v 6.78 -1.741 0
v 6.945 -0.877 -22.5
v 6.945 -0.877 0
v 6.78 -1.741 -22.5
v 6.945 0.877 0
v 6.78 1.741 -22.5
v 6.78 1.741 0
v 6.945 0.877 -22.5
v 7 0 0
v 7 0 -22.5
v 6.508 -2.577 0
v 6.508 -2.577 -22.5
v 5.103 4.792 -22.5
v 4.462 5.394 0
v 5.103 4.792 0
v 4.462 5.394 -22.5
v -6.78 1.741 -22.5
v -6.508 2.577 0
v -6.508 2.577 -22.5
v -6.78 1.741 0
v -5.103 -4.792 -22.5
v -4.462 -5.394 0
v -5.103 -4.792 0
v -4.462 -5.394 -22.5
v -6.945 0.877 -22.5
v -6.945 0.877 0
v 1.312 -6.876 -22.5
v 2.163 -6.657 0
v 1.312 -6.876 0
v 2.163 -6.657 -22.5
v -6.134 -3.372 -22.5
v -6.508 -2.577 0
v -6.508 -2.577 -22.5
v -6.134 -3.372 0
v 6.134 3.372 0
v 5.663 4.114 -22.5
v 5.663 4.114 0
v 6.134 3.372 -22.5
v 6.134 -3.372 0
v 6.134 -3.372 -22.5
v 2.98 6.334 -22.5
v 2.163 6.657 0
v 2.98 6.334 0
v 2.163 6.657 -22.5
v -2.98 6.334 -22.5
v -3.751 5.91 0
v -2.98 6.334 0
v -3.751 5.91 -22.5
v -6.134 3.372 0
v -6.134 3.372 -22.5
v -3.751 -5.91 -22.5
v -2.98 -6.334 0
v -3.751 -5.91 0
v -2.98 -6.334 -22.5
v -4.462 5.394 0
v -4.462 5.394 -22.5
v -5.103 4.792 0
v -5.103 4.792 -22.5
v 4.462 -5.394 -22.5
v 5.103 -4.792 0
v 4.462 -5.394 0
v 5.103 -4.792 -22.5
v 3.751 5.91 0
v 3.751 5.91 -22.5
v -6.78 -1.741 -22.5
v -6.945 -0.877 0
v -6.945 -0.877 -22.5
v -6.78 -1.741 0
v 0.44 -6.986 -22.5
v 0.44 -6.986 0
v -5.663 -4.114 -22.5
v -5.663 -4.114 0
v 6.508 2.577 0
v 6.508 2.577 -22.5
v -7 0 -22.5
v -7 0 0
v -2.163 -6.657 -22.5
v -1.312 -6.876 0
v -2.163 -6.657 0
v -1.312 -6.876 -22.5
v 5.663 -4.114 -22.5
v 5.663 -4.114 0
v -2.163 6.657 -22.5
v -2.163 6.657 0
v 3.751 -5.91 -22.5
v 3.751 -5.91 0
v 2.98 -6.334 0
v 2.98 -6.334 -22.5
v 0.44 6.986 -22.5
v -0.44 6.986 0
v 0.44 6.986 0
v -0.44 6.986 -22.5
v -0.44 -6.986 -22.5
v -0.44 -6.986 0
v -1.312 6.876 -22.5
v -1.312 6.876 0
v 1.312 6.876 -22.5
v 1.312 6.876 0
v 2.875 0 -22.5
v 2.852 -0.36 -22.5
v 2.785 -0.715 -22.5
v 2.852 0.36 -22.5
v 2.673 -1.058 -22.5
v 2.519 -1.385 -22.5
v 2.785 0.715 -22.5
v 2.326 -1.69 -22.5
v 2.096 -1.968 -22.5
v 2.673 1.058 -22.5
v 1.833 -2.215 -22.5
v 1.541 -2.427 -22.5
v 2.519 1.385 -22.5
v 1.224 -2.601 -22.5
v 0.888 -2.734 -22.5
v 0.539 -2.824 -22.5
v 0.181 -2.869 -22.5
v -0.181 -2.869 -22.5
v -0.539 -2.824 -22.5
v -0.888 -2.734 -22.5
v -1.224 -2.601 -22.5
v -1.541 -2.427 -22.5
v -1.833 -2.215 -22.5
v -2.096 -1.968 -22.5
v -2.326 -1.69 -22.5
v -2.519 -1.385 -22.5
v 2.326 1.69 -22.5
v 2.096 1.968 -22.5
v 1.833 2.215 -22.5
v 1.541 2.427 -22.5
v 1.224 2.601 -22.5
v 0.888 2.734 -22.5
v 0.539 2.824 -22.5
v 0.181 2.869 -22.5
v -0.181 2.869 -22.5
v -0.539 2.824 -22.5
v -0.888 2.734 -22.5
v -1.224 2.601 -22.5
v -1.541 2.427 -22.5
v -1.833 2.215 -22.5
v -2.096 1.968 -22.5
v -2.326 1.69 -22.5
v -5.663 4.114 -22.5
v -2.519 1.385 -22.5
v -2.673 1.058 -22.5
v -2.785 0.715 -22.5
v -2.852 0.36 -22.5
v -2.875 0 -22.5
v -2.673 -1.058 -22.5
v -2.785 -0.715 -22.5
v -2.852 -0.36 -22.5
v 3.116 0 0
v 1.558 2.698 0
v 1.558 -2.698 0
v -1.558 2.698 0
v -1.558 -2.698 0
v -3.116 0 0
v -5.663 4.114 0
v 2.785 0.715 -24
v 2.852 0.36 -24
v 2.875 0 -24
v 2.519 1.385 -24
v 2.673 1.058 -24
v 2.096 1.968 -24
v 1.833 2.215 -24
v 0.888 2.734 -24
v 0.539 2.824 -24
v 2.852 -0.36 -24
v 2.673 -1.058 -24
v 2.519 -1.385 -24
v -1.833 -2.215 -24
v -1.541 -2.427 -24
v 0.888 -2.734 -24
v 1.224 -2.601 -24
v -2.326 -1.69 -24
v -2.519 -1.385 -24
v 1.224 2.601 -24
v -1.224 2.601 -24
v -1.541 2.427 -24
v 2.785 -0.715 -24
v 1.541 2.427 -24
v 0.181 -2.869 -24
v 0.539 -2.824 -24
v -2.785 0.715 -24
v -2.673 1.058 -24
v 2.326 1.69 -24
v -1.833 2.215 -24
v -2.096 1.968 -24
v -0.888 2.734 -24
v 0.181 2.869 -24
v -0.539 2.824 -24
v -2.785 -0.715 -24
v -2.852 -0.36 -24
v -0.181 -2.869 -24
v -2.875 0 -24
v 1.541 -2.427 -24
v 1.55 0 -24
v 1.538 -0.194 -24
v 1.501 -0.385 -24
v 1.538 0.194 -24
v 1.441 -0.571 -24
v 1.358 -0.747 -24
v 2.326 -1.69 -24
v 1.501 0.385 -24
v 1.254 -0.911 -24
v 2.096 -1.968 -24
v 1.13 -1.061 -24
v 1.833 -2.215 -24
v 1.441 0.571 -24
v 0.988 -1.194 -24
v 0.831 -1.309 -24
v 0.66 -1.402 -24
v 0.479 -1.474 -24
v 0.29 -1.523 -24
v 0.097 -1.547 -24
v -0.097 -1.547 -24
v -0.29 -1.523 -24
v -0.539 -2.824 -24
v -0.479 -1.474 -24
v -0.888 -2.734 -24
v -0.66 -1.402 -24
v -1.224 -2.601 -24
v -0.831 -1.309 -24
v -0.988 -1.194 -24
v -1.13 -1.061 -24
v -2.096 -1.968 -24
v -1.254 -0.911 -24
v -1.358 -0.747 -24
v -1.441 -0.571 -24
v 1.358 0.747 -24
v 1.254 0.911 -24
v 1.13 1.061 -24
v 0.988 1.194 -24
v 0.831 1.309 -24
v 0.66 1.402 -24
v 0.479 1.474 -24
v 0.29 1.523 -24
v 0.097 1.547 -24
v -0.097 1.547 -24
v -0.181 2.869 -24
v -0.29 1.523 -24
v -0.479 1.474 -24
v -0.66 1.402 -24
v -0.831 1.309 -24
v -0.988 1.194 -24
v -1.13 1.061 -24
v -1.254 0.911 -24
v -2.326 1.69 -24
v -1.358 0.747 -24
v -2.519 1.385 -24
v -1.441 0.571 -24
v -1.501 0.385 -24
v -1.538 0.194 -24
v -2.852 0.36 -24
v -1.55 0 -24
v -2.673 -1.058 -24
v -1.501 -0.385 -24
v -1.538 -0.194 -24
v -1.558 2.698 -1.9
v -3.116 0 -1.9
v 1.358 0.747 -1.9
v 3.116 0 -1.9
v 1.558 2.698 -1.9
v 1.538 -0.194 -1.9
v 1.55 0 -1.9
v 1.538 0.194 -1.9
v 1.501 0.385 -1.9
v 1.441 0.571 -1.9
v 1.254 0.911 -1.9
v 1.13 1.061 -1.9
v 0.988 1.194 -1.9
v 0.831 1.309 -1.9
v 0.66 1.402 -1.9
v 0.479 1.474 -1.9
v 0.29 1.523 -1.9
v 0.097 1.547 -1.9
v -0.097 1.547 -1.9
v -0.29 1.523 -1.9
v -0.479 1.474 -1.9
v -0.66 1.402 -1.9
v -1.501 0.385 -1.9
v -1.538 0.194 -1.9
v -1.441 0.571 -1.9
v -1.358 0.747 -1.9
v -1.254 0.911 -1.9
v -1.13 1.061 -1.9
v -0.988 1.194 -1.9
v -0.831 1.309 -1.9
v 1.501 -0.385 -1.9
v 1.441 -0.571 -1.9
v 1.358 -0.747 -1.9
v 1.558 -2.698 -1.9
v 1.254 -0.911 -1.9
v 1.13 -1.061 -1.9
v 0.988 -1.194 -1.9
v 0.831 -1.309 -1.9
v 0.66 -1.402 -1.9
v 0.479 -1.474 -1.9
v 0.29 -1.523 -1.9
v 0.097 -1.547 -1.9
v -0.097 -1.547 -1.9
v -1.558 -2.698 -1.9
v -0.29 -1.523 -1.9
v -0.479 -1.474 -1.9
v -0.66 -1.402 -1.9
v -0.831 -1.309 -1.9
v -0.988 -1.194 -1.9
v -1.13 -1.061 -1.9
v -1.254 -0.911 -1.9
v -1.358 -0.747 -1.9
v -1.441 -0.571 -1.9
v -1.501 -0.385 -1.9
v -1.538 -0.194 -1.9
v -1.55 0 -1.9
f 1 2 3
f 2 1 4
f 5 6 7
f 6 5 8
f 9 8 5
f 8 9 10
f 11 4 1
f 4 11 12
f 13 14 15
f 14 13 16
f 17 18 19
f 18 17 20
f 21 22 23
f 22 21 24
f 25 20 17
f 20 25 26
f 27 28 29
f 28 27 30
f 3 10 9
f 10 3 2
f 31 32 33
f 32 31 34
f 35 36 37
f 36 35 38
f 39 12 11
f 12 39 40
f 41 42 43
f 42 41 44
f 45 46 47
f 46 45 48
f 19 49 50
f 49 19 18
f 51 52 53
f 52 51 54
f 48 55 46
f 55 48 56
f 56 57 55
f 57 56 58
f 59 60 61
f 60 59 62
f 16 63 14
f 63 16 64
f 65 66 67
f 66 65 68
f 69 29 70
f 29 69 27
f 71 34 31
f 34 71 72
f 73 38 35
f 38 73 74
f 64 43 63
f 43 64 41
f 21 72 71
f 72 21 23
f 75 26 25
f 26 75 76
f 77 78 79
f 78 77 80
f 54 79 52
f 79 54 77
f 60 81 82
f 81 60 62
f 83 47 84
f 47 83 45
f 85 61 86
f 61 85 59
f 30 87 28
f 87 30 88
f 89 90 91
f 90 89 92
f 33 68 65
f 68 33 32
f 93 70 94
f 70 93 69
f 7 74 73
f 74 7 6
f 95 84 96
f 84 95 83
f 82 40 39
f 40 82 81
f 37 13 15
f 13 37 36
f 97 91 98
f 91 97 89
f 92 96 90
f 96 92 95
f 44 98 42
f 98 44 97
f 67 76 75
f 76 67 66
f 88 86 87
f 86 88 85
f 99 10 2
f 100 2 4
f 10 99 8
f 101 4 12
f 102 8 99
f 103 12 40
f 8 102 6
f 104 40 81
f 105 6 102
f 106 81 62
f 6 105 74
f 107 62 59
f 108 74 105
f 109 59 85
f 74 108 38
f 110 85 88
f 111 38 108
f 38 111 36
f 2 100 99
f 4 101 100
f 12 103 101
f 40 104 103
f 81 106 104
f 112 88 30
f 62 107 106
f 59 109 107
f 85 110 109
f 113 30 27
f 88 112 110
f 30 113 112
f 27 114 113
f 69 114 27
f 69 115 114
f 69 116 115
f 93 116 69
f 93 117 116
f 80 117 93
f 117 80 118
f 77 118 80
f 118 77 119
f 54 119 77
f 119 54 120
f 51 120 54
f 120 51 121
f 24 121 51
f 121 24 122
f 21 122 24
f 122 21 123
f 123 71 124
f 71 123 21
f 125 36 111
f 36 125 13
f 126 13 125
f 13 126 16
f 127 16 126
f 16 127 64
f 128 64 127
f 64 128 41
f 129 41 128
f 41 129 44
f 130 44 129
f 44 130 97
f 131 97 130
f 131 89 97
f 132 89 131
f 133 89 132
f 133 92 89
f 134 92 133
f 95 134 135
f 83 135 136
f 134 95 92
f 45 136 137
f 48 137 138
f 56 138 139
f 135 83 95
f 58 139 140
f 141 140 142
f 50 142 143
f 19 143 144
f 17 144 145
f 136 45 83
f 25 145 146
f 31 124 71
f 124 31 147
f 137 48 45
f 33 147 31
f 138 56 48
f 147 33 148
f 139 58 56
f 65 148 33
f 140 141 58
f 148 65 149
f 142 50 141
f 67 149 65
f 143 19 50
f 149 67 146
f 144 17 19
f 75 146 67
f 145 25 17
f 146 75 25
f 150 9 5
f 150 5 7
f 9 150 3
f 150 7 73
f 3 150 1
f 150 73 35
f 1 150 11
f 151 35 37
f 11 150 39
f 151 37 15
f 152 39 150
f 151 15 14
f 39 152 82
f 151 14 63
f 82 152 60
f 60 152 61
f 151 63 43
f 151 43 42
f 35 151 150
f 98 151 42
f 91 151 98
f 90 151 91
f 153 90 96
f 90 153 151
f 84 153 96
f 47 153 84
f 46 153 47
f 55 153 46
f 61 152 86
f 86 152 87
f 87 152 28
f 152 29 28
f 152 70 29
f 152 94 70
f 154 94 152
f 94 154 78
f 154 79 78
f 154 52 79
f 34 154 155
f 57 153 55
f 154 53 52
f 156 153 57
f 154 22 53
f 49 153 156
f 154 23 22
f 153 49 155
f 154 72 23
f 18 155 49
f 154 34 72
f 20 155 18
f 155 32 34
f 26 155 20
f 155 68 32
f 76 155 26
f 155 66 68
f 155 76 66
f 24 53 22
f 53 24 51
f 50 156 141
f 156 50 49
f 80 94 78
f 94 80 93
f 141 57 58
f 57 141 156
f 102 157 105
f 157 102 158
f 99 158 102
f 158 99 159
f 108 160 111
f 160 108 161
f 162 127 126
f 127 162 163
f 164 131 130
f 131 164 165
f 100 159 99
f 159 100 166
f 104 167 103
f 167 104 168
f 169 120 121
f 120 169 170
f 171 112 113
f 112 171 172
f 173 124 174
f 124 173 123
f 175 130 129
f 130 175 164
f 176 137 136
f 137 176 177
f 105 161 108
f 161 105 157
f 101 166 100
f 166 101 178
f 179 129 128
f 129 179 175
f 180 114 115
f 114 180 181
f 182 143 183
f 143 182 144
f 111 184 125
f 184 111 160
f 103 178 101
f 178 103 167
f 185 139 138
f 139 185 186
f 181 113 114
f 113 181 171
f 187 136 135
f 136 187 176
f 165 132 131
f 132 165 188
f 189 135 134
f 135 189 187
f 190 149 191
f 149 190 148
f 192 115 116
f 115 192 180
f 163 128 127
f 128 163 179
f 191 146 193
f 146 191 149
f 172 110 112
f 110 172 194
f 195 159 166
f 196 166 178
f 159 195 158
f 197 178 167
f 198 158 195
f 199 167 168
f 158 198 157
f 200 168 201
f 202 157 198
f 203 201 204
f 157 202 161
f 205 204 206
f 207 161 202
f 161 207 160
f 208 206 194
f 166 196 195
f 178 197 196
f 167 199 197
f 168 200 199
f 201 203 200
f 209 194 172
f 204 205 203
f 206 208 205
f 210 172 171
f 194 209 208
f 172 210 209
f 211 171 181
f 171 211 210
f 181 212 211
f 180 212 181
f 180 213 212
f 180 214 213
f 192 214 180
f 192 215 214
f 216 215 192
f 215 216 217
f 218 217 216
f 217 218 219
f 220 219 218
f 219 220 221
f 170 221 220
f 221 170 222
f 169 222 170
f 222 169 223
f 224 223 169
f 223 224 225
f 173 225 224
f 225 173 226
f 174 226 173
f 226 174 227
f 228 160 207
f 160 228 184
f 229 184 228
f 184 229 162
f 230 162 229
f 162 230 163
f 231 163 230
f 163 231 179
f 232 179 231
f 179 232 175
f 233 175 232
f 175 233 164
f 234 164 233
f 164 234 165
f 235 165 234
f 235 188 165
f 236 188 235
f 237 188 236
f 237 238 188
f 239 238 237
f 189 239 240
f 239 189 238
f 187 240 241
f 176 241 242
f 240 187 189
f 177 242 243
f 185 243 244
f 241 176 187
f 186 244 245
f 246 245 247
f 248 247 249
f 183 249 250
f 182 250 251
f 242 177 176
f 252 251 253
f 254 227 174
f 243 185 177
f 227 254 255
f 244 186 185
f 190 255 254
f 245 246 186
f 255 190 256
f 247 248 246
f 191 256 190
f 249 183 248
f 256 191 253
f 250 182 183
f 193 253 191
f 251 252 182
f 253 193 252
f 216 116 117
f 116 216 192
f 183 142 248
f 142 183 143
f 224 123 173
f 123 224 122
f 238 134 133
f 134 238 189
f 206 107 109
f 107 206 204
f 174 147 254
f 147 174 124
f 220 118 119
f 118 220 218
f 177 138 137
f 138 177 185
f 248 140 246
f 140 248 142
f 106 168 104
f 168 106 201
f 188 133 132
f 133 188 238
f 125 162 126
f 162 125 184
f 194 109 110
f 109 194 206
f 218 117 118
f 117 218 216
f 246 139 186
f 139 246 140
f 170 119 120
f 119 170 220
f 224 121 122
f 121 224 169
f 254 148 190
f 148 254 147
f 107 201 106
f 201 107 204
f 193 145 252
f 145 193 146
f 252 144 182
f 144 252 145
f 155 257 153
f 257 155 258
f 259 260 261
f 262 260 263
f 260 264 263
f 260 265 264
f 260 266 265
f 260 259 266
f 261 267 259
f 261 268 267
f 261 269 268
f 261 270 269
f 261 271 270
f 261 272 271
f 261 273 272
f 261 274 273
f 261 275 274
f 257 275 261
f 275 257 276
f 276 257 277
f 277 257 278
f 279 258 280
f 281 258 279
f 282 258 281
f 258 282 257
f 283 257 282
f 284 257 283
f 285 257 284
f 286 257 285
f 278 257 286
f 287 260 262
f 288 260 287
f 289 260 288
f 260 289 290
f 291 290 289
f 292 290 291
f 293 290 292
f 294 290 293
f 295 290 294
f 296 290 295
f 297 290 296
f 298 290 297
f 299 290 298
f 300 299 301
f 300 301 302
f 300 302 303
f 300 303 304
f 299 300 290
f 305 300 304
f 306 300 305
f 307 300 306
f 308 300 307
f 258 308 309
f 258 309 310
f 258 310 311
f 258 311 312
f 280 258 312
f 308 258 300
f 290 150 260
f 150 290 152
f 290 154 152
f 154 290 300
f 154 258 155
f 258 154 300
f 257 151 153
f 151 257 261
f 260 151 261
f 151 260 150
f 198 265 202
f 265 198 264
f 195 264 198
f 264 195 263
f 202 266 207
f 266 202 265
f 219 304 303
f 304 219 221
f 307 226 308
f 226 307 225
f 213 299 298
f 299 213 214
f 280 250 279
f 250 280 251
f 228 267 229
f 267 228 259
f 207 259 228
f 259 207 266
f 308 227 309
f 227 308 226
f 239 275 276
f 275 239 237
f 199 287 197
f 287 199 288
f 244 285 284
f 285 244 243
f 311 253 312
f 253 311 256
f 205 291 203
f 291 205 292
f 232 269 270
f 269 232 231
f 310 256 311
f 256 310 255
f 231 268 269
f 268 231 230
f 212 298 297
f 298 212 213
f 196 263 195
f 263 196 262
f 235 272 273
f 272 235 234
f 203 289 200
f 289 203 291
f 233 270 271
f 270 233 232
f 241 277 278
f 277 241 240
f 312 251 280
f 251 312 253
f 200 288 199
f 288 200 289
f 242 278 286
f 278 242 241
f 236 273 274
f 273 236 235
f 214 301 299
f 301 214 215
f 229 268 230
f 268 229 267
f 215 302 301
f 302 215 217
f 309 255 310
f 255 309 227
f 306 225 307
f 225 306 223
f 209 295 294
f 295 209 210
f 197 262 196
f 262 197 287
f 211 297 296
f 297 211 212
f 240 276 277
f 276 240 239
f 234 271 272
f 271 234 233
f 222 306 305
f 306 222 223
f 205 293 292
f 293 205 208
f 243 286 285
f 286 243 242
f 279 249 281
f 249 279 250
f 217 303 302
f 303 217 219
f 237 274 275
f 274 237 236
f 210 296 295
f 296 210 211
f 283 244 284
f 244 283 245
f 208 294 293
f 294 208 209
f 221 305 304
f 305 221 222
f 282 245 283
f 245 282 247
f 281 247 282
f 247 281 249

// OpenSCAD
$fn = 50;

difference() {
	union() {
		translate(v = [0, 0, -22.5]) {
			cylinder(h = 22.5, r = 7.0);
		}
		#translate(v = [0, 0, -24.0]) {
			cylinder(h = 24, r = 2.875);
		}
	}
	union() {
		translate(v = [0, 0, 0]) {
			rotate(a = [0, 0, 0]) {
				difference() {
					union() {
						translate(v = [0, 0, -1.9]) {
							linear_extrude(height = 1.9) {
								polygon(points = [[3.1158, 0.0], [1.5579000000000005, 2.698361953111554], [-1.5578999999999994, 2.6983619531115544], [-3.1158, 3.815754496783323e-16], [-1.5579000000000014, -2.6983619531115535], [1.557899999999998, -2.6983619531115552]]);
							}
						}
					}
					union();
				}
			}
		}
		#translate(v = [0, 0, -100.0]) {
			cylinder(h = 200, r = 1.55);
		}
	}
}
